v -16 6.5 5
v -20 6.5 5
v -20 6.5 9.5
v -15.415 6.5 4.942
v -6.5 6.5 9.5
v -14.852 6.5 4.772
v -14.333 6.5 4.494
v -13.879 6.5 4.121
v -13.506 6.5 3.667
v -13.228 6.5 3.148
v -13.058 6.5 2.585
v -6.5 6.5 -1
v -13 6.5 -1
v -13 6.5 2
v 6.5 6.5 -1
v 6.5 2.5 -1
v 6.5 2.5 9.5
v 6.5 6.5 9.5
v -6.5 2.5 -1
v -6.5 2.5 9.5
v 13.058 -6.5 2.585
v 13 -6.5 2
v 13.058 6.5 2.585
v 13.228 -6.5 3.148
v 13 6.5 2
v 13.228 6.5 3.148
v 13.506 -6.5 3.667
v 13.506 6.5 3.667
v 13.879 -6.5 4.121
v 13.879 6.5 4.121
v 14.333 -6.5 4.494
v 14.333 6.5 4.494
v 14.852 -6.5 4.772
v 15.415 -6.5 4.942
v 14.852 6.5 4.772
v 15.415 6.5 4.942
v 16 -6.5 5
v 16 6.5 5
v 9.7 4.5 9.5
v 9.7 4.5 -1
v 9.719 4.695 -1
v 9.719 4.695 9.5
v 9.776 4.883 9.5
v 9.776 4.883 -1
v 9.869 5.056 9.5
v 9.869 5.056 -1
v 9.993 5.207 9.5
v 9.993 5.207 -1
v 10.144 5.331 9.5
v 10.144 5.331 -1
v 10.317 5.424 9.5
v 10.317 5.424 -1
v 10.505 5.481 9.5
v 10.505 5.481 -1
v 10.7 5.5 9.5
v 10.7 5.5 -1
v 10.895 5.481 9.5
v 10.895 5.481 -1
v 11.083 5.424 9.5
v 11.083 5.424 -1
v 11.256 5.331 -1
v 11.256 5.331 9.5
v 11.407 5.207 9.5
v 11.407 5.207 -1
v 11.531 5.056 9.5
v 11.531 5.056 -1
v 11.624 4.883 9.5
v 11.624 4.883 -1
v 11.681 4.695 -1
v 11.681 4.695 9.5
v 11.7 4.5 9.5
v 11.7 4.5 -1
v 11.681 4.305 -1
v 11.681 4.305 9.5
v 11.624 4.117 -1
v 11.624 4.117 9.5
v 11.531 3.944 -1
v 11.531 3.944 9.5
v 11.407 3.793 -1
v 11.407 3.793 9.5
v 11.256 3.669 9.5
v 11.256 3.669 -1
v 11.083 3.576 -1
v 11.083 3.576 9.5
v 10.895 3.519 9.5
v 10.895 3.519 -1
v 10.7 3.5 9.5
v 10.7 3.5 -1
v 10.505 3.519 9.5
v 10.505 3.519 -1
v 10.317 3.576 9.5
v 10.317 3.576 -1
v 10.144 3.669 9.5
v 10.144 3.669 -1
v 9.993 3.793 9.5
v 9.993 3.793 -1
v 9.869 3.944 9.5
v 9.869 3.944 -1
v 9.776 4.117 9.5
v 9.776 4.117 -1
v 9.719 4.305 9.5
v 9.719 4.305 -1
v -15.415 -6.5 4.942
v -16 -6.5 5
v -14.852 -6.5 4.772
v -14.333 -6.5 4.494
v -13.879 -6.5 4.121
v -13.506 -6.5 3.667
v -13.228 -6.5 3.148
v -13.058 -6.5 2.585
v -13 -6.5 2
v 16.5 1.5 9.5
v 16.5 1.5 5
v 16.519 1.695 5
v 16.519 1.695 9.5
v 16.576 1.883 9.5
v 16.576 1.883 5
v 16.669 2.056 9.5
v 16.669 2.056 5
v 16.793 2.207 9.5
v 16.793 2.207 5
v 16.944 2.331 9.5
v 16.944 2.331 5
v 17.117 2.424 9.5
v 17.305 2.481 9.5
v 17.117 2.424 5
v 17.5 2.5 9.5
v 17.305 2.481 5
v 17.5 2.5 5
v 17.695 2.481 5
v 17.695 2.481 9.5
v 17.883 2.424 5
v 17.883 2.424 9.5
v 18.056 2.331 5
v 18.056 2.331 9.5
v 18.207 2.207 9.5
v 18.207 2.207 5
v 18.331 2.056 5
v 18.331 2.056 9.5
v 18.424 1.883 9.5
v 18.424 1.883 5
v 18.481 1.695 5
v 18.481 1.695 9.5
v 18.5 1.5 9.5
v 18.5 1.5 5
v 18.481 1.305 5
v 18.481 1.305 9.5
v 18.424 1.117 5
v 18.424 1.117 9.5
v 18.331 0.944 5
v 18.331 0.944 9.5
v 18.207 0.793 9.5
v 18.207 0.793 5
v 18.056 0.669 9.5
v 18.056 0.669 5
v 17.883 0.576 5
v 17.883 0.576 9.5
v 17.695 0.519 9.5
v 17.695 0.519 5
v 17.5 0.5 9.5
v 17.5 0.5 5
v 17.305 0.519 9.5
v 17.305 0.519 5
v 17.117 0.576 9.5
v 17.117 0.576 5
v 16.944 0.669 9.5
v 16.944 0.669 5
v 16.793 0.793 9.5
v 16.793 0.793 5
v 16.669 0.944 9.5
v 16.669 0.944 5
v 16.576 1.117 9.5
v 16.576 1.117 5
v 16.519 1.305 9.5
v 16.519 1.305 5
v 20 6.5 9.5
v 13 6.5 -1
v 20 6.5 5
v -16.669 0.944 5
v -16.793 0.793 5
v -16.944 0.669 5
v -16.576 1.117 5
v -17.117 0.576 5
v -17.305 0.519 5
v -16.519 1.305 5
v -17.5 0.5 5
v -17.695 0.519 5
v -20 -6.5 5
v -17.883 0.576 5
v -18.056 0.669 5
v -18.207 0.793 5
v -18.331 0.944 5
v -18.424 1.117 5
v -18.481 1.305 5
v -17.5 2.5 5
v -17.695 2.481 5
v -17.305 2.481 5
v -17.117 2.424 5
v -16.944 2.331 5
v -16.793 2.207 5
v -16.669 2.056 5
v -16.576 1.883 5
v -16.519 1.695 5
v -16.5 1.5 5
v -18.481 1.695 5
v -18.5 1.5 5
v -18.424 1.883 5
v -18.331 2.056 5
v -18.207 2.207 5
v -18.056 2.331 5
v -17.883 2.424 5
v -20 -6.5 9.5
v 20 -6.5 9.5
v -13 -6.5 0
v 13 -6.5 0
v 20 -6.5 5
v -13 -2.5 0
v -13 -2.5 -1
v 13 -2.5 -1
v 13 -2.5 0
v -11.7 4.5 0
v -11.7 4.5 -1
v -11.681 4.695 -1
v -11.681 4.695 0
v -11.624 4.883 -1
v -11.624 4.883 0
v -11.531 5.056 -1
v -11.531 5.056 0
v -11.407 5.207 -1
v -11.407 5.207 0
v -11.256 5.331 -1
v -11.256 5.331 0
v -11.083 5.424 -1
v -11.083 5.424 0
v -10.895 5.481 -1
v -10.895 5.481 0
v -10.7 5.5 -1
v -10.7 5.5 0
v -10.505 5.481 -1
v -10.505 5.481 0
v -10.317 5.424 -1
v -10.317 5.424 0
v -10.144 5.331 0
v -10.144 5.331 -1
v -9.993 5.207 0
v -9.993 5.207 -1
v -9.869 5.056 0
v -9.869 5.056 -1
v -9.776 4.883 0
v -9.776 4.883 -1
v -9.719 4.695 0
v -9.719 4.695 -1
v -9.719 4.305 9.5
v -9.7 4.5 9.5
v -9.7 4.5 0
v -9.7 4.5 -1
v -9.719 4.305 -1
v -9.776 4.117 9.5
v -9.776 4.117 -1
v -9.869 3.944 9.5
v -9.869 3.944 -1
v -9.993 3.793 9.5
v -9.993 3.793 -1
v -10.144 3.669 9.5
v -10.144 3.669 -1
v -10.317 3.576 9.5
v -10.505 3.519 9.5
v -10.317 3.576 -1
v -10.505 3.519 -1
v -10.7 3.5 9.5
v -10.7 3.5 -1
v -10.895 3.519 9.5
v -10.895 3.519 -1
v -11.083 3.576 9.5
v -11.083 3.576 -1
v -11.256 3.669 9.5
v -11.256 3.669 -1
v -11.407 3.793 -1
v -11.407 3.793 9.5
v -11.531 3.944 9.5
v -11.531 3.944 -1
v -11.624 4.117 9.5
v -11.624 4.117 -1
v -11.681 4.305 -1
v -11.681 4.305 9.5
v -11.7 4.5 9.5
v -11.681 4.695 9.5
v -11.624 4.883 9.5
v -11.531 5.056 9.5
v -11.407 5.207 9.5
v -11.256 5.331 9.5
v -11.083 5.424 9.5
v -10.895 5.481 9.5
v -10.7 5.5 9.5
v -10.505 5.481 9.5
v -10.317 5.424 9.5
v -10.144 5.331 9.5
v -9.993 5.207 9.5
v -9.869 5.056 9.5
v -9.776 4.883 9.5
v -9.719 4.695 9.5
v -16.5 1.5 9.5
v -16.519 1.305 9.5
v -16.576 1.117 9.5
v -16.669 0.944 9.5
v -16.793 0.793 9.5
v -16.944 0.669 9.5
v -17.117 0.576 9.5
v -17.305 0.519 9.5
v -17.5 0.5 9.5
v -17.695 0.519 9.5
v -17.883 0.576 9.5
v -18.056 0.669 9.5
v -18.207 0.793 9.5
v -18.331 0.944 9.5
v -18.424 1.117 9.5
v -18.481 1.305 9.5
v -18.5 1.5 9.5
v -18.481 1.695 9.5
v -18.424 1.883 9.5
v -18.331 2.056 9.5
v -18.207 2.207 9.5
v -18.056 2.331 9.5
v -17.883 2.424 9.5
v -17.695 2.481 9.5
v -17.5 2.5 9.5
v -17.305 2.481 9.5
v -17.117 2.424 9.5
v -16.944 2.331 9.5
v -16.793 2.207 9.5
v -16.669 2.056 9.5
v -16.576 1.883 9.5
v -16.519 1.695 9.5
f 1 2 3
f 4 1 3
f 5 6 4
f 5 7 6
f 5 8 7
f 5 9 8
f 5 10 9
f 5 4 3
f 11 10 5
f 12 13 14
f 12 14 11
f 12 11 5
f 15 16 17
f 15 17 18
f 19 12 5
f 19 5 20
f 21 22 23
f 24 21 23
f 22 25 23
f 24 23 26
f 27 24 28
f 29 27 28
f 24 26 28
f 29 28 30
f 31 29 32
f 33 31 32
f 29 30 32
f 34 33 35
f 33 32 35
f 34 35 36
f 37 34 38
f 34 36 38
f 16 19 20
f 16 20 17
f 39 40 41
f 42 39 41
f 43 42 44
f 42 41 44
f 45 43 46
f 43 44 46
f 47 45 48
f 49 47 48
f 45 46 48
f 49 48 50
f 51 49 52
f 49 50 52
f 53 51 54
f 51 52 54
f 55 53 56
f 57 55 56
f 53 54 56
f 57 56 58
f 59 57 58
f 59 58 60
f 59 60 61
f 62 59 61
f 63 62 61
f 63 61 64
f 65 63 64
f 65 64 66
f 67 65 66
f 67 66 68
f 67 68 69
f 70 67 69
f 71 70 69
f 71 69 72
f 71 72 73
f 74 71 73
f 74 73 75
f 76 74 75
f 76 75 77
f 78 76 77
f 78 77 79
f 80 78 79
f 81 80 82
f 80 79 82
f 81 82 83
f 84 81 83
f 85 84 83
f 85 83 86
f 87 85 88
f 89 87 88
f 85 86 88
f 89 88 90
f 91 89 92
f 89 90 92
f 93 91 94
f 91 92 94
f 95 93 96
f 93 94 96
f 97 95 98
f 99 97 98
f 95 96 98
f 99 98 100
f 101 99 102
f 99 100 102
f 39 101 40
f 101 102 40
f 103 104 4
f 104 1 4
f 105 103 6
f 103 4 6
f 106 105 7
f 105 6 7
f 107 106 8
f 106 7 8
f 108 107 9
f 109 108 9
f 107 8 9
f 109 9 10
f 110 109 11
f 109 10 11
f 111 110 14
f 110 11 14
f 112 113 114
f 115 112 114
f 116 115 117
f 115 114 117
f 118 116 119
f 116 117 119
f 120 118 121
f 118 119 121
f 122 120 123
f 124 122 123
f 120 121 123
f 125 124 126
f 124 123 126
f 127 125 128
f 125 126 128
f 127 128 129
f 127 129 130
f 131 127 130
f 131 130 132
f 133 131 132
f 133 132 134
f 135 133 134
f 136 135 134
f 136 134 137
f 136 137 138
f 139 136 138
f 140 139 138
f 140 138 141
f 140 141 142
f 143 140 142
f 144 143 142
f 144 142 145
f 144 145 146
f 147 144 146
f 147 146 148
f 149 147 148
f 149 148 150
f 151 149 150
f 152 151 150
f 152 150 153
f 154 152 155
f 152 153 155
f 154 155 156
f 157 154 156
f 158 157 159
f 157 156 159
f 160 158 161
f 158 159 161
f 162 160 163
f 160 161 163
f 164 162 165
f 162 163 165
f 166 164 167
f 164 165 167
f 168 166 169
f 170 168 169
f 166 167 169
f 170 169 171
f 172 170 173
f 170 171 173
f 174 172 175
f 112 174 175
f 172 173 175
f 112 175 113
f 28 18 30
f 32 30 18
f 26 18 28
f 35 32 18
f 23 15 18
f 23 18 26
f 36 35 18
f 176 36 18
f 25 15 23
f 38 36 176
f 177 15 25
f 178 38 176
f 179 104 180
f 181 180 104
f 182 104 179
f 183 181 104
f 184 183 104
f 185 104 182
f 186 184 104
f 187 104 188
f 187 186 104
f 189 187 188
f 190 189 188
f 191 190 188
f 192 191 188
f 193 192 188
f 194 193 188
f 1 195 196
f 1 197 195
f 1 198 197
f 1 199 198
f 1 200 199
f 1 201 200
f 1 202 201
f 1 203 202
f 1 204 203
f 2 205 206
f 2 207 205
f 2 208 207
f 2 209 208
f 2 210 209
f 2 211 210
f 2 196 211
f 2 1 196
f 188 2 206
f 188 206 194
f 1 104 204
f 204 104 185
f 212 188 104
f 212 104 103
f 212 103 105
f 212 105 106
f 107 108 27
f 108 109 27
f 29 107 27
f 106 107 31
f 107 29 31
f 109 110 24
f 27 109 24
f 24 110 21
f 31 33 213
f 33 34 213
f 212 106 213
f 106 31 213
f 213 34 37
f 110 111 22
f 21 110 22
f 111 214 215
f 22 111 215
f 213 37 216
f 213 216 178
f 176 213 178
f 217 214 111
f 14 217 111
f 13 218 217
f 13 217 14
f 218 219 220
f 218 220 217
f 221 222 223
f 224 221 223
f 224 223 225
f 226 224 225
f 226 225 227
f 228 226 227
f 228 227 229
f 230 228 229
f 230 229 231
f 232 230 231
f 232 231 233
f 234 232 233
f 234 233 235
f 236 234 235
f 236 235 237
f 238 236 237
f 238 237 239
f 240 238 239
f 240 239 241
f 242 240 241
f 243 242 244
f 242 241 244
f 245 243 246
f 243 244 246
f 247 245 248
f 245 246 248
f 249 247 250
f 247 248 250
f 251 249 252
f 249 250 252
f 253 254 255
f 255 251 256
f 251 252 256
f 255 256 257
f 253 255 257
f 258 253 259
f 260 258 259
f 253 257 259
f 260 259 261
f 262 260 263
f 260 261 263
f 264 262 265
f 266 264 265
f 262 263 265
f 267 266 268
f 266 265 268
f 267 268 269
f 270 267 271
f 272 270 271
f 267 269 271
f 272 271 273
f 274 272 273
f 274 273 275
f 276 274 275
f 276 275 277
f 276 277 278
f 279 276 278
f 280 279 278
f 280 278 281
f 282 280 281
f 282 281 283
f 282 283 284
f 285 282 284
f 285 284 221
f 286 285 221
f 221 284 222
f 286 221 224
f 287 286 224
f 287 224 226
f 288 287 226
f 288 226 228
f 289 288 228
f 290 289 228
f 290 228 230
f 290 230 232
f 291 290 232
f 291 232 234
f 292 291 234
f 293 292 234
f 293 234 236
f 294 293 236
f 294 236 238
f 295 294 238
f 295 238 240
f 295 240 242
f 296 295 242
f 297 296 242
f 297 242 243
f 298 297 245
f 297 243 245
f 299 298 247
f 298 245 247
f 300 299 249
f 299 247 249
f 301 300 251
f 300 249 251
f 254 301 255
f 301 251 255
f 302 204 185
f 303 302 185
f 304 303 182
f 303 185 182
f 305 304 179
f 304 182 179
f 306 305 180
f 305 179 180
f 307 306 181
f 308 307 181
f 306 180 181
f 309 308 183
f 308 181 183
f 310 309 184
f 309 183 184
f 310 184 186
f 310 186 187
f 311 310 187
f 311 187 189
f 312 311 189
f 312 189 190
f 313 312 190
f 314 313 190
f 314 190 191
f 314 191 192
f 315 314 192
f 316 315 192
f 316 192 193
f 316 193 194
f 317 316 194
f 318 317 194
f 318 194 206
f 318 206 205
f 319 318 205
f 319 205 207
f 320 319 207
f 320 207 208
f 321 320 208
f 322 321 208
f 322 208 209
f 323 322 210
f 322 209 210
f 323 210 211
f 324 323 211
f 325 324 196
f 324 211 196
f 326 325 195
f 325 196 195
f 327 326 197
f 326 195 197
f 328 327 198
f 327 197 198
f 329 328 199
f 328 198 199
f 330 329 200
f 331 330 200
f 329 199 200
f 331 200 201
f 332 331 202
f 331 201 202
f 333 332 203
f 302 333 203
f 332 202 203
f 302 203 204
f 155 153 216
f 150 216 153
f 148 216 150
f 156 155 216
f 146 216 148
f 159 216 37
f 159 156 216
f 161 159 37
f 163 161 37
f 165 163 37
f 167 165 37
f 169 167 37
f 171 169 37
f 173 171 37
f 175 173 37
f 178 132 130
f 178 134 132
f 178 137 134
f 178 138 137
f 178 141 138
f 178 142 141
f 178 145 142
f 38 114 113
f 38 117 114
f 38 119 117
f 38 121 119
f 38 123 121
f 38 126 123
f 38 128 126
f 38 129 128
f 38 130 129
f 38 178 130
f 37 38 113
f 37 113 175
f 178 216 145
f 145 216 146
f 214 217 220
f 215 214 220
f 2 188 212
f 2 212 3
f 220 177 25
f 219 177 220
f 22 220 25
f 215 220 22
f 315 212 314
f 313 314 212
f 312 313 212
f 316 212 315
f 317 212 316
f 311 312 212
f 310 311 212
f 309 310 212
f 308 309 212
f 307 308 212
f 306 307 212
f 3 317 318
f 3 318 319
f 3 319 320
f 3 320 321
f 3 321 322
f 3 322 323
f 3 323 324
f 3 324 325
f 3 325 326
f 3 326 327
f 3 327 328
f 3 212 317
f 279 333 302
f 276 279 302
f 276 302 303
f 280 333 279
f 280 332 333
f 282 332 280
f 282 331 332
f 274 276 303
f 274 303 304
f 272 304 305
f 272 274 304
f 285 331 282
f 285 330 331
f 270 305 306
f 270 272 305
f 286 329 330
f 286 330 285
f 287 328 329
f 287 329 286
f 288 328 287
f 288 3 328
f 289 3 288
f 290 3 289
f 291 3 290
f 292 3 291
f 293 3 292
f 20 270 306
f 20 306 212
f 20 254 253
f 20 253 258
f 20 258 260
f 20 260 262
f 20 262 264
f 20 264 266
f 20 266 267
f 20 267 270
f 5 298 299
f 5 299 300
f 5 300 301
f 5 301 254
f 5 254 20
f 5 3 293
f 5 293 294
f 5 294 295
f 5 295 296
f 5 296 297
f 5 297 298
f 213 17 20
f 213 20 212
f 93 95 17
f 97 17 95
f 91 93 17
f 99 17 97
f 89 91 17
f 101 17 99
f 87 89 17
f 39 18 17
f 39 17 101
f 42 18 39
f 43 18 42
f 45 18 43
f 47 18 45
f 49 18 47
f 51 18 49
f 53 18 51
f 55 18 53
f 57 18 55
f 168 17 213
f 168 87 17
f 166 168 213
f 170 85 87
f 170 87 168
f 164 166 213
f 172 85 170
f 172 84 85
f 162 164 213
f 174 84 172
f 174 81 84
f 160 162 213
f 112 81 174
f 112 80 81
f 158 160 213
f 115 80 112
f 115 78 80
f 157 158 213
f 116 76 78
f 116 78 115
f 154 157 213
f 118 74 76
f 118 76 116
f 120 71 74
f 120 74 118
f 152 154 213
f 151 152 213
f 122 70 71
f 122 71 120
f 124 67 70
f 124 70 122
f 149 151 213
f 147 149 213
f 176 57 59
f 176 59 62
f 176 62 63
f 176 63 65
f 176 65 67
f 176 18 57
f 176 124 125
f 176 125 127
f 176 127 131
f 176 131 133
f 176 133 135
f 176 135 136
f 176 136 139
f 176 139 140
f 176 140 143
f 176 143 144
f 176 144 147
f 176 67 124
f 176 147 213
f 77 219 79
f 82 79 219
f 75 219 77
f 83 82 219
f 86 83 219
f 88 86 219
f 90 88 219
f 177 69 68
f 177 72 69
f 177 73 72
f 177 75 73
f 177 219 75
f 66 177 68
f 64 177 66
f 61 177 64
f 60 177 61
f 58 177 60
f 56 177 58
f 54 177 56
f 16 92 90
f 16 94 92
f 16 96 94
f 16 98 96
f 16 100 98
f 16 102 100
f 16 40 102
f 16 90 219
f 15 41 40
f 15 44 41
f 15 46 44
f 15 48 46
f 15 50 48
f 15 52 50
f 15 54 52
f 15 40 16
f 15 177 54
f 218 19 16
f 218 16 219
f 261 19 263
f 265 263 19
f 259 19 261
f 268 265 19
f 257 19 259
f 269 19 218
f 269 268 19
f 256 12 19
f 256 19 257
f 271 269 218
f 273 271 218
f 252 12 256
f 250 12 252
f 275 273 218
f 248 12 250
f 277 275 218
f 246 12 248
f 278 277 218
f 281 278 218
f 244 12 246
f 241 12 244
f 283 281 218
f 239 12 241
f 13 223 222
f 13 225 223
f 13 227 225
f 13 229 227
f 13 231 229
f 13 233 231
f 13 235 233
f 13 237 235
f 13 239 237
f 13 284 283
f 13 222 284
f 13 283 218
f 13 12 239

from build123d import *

# Parameters (mm, degrees)
SKETCH_2_W          = 40
SKETCH_2_H          = 13
EXTRUDE_1_DEPTH     = 9.5
SKETCH_3_R          = 1
CUT_EXTRUDE_1_DEPTH = 10
SKETCH_4_R          = 1
SKETCH_4_W          = 13
SKETCH_4_H          = 4
CUT_EXTRUDE_2_DEPTH = 10
SKETCH_5_W          = 7
SKETCH_5_H          = 13
CUT_EXTRUDE_3_DEPTH = 5
FILLET_1_R          = 3
EXTRUDE_START       = 1
SKETCH_6_R          = 1
EXTRUDE_2_DEPTH     = 1


with BuildPart() as part:
    # 草图2 → 凸台-拉伸1 (new body)
    with BuildSketch(Plane.XY):
        Rectangle(SKETCH_2_W, SKETCH_2_H)
    extrude(amount=EXTRUDE_1_DEPTH)

    # 草图3 → 切除-拉伸1 (cut)
    with BuildSketch(Plane(origin=(0, 0, 0), x_dir=(-1, 0, 0), z_dir=(0, 0, -1))):
        with Locations((-17.5, 1.5)):
            Circle(SKETCH_3_R)
        with Locations(Location((17.5, 1.5, 0), (0, 0, 180))):
            Circle(SKETCH_3_R)
    extrude(amount=-CUT_EXTRUDE_1_DEPTH, mode=Mode.SUBTRACT)

    # 草图4 → 切除-拉伸2 (cut)
    with BuildSketch(Plane(origin=(0, 0, 0), x_dir=(-1, 0, 0), z_dir=(0, 0, -1))):
        with Locations((-10.7, 4.5)):
            Circle(SKETCH_4_R)
        with Locations(Location((10.7, 4.5, 0), (0, 0, 180))):
            Circle(SKETCH_4_R)
        with Locations((0, 4.5)):
            Rectangle(SKETCH_4_W, SKETCH_4_H)
    extrude(amount=-CUT_EXTRUDE_2_DEPTH, mode=Mode.SUBTRACT)

    # 草图5 → 切除-拉伸3 (cut)
    with BuildSketch(Plane(origin=(0, 0, 0), x_dir=(-1, 0, 0), z_dir=(0, 0, -1))):
        with Locations((-16.5, 0)):
            Rectangle(SKETCH_5_W, SKETCH_5_H)
        with Locations((16.5, 0)):
            Rectangle(SKETCH_5_W, SKETCH_5_H)
    extrude(amount=-CUT_EXTRUDE_3_DEPTH, mode=Mode.SUBTRACT)

    # 圆角1
    fillet_1_edges = [part.edges().sort_by_distance(p)[0] for p in [
        (13, 0, 5),
        (-13, 0, 5),
    ]]
    fillet(fillet_1_edges, radius=FILLET_1_R)

    # 草图6 → 凸台-拉伸2 (add)
    with BuildSketch(Plane(origin=(0, 0, 0), x_dir=(-1, 0, 0), z_dir=(0, 0, -1)).offset(EXTRUDE_START)):
        Polygon((-13, -2.5), (13, -2.5), (13, 6.5), (6.5, 6.5), (6.5, 2.5), (-6.5, 2.5), (-6.5, 6.5), (-13, 6.5), align=None)
        with Locations((-10.7, 4.5)):
            Circle(SKETCH_6_R, mode=Mode.SUBTRACT)
        with Locations((10.7, 4.5)):
            Circle(SKETCH_6_R, mode=Mode.SUBTRACT)
    extrude(amount=-EXTRUDE_2_DEPTH)


solid = part.part
